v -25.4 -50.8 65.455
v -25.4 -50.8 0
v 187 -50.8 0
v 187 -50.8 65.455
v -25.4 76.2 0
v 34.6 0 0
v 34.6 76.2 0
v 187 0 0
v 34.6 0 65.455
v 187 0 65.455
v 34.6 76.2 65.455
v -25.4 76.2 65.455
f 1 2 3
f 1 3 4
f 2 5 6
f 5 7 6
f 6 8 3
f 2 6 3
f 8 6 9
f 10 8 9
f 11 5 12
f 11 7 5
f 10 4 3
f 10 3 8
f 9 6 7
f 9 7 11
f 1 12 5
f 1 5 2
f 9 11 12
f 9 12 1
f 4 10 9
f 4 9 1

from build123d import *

# Parameters (mm, degrees)
F0_W      = 34.599658
F0_H      = 65.455198
F1_DEPTH  = 50.8
F1_FACE_W = 50.8
F1_FACE_H = 65.455198
F2_DEPTH  = 152.4
F3_DEPTH  = 76.2
F3_FACE_W = 127
F3_FACE_H = 65.455198
F4_DEPTH  = 25.4


with BuildPart() as f1:
    # F0 (on Front) → F1 (new body)
    with BuildSketch(Plane.XZ):
        with Locations((17.299829, 32.727599)):
            Rectangle(F0_W, F0_H)
    extrude(amount=F1_DEPTH)

    # F1_face (on face) → F2 (join)
    with BuildSketch(Plane(origin=(34.599658, -25.4, 32.727599), x_dir=(0, 1, 0), z_dir=(1, 0, 0))):
        Rectangle(F1_FACE_W, F1_FACE_H)
    extrude(amount=F2_DEPTH)

    # F0 (on Front) → F3 (join)
    with BuildSketch(Plane.XZ):
        with Locations((17.299829, 32.727599)):
            Rectangle(F0_W, F0_H)
    extrude(amount=-F3_DEPTH)

    # F3_face (on face) → F4 (join)
    with BuildSketch(Plane(origin=(0, 12.7, 32.727599), x_dir=(0, -1, 0), z_dir=(-1, 0, 0))):
        Rectangle(F3_FACE_W, F3_FACE_H)
    extrude(amount=F4_DEPTH)


solid = f1.part
